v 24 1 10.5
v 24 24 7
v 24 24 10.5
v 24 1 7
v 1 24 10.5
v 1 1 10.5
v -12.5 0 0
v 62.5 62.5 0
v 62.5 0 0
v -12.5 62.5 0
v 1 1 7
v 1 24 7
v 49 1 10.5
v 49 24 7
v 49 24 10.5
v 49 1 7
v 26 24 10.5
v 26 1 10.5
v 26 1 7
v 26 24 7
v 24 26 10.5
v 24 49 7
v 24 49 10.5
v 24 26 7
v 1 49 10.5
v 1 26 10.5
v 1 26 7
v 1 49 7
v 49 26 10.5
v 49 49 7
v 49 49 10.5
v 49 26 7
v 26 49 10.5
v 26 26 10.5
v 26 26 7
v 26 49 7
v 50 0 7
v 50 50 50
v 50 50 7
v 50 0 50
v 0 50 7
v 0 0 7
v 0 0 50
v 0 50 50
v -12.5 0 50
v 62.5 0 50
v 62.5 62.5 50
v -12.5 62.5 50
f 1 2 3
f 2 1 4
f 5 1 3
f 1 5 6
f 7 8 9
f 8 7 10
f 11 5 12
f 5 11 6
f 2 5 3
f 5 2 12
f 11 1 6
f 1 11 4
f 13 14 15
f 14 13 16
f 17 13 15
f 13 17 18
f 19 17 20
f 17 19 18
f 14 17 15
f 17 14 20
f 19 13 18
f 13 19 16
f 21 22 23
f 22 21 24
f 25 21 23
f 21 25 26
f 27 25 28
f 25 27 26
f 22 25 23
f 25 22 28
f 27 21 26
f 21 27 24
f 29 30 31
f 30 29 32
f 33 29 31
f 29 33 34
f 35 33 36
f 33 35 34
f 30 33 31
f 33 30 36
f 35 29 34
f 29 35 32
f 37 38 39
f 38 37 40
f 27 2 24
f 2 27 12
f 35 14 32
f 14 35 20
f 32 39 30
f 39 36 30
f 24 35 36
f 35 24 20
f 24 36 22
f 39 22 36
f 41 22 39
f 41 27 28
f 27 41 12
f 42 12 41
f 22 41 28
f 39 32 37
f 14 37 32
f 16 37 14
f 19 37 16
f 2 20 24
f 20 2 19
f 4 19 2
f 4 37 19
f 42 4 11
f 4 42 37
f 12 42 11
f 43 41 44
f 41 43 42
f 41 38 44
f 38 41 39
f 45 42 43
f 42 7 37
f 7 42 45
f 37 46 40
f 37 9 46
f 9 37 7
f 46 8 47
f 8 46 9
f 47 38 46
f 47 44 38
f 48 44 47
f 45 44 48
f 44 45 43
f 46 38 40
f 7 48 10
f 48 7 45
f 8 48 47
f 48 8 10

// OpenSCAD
color("LightGray") {
    translate([1,1,0]) cube([23,23,6+4.5]);
    translate([25+1,1,0]) cube([23,23,6+4.5]);
    translate([1,25+1,0]) cube([23,23,6+4.5]);
    translate([25+1,25+1,0]) cube([23,23,6+4.5]);
}
color("Grey") {
    cube([50,50,7]);
    translate([-12.5,50,0]) cube([50+25,12.5,50]);
    translate([50,0,0]) cube([12.5,50,50]);
    translate([-12.5,0,0]) cube([12.5,50,50]);
}
